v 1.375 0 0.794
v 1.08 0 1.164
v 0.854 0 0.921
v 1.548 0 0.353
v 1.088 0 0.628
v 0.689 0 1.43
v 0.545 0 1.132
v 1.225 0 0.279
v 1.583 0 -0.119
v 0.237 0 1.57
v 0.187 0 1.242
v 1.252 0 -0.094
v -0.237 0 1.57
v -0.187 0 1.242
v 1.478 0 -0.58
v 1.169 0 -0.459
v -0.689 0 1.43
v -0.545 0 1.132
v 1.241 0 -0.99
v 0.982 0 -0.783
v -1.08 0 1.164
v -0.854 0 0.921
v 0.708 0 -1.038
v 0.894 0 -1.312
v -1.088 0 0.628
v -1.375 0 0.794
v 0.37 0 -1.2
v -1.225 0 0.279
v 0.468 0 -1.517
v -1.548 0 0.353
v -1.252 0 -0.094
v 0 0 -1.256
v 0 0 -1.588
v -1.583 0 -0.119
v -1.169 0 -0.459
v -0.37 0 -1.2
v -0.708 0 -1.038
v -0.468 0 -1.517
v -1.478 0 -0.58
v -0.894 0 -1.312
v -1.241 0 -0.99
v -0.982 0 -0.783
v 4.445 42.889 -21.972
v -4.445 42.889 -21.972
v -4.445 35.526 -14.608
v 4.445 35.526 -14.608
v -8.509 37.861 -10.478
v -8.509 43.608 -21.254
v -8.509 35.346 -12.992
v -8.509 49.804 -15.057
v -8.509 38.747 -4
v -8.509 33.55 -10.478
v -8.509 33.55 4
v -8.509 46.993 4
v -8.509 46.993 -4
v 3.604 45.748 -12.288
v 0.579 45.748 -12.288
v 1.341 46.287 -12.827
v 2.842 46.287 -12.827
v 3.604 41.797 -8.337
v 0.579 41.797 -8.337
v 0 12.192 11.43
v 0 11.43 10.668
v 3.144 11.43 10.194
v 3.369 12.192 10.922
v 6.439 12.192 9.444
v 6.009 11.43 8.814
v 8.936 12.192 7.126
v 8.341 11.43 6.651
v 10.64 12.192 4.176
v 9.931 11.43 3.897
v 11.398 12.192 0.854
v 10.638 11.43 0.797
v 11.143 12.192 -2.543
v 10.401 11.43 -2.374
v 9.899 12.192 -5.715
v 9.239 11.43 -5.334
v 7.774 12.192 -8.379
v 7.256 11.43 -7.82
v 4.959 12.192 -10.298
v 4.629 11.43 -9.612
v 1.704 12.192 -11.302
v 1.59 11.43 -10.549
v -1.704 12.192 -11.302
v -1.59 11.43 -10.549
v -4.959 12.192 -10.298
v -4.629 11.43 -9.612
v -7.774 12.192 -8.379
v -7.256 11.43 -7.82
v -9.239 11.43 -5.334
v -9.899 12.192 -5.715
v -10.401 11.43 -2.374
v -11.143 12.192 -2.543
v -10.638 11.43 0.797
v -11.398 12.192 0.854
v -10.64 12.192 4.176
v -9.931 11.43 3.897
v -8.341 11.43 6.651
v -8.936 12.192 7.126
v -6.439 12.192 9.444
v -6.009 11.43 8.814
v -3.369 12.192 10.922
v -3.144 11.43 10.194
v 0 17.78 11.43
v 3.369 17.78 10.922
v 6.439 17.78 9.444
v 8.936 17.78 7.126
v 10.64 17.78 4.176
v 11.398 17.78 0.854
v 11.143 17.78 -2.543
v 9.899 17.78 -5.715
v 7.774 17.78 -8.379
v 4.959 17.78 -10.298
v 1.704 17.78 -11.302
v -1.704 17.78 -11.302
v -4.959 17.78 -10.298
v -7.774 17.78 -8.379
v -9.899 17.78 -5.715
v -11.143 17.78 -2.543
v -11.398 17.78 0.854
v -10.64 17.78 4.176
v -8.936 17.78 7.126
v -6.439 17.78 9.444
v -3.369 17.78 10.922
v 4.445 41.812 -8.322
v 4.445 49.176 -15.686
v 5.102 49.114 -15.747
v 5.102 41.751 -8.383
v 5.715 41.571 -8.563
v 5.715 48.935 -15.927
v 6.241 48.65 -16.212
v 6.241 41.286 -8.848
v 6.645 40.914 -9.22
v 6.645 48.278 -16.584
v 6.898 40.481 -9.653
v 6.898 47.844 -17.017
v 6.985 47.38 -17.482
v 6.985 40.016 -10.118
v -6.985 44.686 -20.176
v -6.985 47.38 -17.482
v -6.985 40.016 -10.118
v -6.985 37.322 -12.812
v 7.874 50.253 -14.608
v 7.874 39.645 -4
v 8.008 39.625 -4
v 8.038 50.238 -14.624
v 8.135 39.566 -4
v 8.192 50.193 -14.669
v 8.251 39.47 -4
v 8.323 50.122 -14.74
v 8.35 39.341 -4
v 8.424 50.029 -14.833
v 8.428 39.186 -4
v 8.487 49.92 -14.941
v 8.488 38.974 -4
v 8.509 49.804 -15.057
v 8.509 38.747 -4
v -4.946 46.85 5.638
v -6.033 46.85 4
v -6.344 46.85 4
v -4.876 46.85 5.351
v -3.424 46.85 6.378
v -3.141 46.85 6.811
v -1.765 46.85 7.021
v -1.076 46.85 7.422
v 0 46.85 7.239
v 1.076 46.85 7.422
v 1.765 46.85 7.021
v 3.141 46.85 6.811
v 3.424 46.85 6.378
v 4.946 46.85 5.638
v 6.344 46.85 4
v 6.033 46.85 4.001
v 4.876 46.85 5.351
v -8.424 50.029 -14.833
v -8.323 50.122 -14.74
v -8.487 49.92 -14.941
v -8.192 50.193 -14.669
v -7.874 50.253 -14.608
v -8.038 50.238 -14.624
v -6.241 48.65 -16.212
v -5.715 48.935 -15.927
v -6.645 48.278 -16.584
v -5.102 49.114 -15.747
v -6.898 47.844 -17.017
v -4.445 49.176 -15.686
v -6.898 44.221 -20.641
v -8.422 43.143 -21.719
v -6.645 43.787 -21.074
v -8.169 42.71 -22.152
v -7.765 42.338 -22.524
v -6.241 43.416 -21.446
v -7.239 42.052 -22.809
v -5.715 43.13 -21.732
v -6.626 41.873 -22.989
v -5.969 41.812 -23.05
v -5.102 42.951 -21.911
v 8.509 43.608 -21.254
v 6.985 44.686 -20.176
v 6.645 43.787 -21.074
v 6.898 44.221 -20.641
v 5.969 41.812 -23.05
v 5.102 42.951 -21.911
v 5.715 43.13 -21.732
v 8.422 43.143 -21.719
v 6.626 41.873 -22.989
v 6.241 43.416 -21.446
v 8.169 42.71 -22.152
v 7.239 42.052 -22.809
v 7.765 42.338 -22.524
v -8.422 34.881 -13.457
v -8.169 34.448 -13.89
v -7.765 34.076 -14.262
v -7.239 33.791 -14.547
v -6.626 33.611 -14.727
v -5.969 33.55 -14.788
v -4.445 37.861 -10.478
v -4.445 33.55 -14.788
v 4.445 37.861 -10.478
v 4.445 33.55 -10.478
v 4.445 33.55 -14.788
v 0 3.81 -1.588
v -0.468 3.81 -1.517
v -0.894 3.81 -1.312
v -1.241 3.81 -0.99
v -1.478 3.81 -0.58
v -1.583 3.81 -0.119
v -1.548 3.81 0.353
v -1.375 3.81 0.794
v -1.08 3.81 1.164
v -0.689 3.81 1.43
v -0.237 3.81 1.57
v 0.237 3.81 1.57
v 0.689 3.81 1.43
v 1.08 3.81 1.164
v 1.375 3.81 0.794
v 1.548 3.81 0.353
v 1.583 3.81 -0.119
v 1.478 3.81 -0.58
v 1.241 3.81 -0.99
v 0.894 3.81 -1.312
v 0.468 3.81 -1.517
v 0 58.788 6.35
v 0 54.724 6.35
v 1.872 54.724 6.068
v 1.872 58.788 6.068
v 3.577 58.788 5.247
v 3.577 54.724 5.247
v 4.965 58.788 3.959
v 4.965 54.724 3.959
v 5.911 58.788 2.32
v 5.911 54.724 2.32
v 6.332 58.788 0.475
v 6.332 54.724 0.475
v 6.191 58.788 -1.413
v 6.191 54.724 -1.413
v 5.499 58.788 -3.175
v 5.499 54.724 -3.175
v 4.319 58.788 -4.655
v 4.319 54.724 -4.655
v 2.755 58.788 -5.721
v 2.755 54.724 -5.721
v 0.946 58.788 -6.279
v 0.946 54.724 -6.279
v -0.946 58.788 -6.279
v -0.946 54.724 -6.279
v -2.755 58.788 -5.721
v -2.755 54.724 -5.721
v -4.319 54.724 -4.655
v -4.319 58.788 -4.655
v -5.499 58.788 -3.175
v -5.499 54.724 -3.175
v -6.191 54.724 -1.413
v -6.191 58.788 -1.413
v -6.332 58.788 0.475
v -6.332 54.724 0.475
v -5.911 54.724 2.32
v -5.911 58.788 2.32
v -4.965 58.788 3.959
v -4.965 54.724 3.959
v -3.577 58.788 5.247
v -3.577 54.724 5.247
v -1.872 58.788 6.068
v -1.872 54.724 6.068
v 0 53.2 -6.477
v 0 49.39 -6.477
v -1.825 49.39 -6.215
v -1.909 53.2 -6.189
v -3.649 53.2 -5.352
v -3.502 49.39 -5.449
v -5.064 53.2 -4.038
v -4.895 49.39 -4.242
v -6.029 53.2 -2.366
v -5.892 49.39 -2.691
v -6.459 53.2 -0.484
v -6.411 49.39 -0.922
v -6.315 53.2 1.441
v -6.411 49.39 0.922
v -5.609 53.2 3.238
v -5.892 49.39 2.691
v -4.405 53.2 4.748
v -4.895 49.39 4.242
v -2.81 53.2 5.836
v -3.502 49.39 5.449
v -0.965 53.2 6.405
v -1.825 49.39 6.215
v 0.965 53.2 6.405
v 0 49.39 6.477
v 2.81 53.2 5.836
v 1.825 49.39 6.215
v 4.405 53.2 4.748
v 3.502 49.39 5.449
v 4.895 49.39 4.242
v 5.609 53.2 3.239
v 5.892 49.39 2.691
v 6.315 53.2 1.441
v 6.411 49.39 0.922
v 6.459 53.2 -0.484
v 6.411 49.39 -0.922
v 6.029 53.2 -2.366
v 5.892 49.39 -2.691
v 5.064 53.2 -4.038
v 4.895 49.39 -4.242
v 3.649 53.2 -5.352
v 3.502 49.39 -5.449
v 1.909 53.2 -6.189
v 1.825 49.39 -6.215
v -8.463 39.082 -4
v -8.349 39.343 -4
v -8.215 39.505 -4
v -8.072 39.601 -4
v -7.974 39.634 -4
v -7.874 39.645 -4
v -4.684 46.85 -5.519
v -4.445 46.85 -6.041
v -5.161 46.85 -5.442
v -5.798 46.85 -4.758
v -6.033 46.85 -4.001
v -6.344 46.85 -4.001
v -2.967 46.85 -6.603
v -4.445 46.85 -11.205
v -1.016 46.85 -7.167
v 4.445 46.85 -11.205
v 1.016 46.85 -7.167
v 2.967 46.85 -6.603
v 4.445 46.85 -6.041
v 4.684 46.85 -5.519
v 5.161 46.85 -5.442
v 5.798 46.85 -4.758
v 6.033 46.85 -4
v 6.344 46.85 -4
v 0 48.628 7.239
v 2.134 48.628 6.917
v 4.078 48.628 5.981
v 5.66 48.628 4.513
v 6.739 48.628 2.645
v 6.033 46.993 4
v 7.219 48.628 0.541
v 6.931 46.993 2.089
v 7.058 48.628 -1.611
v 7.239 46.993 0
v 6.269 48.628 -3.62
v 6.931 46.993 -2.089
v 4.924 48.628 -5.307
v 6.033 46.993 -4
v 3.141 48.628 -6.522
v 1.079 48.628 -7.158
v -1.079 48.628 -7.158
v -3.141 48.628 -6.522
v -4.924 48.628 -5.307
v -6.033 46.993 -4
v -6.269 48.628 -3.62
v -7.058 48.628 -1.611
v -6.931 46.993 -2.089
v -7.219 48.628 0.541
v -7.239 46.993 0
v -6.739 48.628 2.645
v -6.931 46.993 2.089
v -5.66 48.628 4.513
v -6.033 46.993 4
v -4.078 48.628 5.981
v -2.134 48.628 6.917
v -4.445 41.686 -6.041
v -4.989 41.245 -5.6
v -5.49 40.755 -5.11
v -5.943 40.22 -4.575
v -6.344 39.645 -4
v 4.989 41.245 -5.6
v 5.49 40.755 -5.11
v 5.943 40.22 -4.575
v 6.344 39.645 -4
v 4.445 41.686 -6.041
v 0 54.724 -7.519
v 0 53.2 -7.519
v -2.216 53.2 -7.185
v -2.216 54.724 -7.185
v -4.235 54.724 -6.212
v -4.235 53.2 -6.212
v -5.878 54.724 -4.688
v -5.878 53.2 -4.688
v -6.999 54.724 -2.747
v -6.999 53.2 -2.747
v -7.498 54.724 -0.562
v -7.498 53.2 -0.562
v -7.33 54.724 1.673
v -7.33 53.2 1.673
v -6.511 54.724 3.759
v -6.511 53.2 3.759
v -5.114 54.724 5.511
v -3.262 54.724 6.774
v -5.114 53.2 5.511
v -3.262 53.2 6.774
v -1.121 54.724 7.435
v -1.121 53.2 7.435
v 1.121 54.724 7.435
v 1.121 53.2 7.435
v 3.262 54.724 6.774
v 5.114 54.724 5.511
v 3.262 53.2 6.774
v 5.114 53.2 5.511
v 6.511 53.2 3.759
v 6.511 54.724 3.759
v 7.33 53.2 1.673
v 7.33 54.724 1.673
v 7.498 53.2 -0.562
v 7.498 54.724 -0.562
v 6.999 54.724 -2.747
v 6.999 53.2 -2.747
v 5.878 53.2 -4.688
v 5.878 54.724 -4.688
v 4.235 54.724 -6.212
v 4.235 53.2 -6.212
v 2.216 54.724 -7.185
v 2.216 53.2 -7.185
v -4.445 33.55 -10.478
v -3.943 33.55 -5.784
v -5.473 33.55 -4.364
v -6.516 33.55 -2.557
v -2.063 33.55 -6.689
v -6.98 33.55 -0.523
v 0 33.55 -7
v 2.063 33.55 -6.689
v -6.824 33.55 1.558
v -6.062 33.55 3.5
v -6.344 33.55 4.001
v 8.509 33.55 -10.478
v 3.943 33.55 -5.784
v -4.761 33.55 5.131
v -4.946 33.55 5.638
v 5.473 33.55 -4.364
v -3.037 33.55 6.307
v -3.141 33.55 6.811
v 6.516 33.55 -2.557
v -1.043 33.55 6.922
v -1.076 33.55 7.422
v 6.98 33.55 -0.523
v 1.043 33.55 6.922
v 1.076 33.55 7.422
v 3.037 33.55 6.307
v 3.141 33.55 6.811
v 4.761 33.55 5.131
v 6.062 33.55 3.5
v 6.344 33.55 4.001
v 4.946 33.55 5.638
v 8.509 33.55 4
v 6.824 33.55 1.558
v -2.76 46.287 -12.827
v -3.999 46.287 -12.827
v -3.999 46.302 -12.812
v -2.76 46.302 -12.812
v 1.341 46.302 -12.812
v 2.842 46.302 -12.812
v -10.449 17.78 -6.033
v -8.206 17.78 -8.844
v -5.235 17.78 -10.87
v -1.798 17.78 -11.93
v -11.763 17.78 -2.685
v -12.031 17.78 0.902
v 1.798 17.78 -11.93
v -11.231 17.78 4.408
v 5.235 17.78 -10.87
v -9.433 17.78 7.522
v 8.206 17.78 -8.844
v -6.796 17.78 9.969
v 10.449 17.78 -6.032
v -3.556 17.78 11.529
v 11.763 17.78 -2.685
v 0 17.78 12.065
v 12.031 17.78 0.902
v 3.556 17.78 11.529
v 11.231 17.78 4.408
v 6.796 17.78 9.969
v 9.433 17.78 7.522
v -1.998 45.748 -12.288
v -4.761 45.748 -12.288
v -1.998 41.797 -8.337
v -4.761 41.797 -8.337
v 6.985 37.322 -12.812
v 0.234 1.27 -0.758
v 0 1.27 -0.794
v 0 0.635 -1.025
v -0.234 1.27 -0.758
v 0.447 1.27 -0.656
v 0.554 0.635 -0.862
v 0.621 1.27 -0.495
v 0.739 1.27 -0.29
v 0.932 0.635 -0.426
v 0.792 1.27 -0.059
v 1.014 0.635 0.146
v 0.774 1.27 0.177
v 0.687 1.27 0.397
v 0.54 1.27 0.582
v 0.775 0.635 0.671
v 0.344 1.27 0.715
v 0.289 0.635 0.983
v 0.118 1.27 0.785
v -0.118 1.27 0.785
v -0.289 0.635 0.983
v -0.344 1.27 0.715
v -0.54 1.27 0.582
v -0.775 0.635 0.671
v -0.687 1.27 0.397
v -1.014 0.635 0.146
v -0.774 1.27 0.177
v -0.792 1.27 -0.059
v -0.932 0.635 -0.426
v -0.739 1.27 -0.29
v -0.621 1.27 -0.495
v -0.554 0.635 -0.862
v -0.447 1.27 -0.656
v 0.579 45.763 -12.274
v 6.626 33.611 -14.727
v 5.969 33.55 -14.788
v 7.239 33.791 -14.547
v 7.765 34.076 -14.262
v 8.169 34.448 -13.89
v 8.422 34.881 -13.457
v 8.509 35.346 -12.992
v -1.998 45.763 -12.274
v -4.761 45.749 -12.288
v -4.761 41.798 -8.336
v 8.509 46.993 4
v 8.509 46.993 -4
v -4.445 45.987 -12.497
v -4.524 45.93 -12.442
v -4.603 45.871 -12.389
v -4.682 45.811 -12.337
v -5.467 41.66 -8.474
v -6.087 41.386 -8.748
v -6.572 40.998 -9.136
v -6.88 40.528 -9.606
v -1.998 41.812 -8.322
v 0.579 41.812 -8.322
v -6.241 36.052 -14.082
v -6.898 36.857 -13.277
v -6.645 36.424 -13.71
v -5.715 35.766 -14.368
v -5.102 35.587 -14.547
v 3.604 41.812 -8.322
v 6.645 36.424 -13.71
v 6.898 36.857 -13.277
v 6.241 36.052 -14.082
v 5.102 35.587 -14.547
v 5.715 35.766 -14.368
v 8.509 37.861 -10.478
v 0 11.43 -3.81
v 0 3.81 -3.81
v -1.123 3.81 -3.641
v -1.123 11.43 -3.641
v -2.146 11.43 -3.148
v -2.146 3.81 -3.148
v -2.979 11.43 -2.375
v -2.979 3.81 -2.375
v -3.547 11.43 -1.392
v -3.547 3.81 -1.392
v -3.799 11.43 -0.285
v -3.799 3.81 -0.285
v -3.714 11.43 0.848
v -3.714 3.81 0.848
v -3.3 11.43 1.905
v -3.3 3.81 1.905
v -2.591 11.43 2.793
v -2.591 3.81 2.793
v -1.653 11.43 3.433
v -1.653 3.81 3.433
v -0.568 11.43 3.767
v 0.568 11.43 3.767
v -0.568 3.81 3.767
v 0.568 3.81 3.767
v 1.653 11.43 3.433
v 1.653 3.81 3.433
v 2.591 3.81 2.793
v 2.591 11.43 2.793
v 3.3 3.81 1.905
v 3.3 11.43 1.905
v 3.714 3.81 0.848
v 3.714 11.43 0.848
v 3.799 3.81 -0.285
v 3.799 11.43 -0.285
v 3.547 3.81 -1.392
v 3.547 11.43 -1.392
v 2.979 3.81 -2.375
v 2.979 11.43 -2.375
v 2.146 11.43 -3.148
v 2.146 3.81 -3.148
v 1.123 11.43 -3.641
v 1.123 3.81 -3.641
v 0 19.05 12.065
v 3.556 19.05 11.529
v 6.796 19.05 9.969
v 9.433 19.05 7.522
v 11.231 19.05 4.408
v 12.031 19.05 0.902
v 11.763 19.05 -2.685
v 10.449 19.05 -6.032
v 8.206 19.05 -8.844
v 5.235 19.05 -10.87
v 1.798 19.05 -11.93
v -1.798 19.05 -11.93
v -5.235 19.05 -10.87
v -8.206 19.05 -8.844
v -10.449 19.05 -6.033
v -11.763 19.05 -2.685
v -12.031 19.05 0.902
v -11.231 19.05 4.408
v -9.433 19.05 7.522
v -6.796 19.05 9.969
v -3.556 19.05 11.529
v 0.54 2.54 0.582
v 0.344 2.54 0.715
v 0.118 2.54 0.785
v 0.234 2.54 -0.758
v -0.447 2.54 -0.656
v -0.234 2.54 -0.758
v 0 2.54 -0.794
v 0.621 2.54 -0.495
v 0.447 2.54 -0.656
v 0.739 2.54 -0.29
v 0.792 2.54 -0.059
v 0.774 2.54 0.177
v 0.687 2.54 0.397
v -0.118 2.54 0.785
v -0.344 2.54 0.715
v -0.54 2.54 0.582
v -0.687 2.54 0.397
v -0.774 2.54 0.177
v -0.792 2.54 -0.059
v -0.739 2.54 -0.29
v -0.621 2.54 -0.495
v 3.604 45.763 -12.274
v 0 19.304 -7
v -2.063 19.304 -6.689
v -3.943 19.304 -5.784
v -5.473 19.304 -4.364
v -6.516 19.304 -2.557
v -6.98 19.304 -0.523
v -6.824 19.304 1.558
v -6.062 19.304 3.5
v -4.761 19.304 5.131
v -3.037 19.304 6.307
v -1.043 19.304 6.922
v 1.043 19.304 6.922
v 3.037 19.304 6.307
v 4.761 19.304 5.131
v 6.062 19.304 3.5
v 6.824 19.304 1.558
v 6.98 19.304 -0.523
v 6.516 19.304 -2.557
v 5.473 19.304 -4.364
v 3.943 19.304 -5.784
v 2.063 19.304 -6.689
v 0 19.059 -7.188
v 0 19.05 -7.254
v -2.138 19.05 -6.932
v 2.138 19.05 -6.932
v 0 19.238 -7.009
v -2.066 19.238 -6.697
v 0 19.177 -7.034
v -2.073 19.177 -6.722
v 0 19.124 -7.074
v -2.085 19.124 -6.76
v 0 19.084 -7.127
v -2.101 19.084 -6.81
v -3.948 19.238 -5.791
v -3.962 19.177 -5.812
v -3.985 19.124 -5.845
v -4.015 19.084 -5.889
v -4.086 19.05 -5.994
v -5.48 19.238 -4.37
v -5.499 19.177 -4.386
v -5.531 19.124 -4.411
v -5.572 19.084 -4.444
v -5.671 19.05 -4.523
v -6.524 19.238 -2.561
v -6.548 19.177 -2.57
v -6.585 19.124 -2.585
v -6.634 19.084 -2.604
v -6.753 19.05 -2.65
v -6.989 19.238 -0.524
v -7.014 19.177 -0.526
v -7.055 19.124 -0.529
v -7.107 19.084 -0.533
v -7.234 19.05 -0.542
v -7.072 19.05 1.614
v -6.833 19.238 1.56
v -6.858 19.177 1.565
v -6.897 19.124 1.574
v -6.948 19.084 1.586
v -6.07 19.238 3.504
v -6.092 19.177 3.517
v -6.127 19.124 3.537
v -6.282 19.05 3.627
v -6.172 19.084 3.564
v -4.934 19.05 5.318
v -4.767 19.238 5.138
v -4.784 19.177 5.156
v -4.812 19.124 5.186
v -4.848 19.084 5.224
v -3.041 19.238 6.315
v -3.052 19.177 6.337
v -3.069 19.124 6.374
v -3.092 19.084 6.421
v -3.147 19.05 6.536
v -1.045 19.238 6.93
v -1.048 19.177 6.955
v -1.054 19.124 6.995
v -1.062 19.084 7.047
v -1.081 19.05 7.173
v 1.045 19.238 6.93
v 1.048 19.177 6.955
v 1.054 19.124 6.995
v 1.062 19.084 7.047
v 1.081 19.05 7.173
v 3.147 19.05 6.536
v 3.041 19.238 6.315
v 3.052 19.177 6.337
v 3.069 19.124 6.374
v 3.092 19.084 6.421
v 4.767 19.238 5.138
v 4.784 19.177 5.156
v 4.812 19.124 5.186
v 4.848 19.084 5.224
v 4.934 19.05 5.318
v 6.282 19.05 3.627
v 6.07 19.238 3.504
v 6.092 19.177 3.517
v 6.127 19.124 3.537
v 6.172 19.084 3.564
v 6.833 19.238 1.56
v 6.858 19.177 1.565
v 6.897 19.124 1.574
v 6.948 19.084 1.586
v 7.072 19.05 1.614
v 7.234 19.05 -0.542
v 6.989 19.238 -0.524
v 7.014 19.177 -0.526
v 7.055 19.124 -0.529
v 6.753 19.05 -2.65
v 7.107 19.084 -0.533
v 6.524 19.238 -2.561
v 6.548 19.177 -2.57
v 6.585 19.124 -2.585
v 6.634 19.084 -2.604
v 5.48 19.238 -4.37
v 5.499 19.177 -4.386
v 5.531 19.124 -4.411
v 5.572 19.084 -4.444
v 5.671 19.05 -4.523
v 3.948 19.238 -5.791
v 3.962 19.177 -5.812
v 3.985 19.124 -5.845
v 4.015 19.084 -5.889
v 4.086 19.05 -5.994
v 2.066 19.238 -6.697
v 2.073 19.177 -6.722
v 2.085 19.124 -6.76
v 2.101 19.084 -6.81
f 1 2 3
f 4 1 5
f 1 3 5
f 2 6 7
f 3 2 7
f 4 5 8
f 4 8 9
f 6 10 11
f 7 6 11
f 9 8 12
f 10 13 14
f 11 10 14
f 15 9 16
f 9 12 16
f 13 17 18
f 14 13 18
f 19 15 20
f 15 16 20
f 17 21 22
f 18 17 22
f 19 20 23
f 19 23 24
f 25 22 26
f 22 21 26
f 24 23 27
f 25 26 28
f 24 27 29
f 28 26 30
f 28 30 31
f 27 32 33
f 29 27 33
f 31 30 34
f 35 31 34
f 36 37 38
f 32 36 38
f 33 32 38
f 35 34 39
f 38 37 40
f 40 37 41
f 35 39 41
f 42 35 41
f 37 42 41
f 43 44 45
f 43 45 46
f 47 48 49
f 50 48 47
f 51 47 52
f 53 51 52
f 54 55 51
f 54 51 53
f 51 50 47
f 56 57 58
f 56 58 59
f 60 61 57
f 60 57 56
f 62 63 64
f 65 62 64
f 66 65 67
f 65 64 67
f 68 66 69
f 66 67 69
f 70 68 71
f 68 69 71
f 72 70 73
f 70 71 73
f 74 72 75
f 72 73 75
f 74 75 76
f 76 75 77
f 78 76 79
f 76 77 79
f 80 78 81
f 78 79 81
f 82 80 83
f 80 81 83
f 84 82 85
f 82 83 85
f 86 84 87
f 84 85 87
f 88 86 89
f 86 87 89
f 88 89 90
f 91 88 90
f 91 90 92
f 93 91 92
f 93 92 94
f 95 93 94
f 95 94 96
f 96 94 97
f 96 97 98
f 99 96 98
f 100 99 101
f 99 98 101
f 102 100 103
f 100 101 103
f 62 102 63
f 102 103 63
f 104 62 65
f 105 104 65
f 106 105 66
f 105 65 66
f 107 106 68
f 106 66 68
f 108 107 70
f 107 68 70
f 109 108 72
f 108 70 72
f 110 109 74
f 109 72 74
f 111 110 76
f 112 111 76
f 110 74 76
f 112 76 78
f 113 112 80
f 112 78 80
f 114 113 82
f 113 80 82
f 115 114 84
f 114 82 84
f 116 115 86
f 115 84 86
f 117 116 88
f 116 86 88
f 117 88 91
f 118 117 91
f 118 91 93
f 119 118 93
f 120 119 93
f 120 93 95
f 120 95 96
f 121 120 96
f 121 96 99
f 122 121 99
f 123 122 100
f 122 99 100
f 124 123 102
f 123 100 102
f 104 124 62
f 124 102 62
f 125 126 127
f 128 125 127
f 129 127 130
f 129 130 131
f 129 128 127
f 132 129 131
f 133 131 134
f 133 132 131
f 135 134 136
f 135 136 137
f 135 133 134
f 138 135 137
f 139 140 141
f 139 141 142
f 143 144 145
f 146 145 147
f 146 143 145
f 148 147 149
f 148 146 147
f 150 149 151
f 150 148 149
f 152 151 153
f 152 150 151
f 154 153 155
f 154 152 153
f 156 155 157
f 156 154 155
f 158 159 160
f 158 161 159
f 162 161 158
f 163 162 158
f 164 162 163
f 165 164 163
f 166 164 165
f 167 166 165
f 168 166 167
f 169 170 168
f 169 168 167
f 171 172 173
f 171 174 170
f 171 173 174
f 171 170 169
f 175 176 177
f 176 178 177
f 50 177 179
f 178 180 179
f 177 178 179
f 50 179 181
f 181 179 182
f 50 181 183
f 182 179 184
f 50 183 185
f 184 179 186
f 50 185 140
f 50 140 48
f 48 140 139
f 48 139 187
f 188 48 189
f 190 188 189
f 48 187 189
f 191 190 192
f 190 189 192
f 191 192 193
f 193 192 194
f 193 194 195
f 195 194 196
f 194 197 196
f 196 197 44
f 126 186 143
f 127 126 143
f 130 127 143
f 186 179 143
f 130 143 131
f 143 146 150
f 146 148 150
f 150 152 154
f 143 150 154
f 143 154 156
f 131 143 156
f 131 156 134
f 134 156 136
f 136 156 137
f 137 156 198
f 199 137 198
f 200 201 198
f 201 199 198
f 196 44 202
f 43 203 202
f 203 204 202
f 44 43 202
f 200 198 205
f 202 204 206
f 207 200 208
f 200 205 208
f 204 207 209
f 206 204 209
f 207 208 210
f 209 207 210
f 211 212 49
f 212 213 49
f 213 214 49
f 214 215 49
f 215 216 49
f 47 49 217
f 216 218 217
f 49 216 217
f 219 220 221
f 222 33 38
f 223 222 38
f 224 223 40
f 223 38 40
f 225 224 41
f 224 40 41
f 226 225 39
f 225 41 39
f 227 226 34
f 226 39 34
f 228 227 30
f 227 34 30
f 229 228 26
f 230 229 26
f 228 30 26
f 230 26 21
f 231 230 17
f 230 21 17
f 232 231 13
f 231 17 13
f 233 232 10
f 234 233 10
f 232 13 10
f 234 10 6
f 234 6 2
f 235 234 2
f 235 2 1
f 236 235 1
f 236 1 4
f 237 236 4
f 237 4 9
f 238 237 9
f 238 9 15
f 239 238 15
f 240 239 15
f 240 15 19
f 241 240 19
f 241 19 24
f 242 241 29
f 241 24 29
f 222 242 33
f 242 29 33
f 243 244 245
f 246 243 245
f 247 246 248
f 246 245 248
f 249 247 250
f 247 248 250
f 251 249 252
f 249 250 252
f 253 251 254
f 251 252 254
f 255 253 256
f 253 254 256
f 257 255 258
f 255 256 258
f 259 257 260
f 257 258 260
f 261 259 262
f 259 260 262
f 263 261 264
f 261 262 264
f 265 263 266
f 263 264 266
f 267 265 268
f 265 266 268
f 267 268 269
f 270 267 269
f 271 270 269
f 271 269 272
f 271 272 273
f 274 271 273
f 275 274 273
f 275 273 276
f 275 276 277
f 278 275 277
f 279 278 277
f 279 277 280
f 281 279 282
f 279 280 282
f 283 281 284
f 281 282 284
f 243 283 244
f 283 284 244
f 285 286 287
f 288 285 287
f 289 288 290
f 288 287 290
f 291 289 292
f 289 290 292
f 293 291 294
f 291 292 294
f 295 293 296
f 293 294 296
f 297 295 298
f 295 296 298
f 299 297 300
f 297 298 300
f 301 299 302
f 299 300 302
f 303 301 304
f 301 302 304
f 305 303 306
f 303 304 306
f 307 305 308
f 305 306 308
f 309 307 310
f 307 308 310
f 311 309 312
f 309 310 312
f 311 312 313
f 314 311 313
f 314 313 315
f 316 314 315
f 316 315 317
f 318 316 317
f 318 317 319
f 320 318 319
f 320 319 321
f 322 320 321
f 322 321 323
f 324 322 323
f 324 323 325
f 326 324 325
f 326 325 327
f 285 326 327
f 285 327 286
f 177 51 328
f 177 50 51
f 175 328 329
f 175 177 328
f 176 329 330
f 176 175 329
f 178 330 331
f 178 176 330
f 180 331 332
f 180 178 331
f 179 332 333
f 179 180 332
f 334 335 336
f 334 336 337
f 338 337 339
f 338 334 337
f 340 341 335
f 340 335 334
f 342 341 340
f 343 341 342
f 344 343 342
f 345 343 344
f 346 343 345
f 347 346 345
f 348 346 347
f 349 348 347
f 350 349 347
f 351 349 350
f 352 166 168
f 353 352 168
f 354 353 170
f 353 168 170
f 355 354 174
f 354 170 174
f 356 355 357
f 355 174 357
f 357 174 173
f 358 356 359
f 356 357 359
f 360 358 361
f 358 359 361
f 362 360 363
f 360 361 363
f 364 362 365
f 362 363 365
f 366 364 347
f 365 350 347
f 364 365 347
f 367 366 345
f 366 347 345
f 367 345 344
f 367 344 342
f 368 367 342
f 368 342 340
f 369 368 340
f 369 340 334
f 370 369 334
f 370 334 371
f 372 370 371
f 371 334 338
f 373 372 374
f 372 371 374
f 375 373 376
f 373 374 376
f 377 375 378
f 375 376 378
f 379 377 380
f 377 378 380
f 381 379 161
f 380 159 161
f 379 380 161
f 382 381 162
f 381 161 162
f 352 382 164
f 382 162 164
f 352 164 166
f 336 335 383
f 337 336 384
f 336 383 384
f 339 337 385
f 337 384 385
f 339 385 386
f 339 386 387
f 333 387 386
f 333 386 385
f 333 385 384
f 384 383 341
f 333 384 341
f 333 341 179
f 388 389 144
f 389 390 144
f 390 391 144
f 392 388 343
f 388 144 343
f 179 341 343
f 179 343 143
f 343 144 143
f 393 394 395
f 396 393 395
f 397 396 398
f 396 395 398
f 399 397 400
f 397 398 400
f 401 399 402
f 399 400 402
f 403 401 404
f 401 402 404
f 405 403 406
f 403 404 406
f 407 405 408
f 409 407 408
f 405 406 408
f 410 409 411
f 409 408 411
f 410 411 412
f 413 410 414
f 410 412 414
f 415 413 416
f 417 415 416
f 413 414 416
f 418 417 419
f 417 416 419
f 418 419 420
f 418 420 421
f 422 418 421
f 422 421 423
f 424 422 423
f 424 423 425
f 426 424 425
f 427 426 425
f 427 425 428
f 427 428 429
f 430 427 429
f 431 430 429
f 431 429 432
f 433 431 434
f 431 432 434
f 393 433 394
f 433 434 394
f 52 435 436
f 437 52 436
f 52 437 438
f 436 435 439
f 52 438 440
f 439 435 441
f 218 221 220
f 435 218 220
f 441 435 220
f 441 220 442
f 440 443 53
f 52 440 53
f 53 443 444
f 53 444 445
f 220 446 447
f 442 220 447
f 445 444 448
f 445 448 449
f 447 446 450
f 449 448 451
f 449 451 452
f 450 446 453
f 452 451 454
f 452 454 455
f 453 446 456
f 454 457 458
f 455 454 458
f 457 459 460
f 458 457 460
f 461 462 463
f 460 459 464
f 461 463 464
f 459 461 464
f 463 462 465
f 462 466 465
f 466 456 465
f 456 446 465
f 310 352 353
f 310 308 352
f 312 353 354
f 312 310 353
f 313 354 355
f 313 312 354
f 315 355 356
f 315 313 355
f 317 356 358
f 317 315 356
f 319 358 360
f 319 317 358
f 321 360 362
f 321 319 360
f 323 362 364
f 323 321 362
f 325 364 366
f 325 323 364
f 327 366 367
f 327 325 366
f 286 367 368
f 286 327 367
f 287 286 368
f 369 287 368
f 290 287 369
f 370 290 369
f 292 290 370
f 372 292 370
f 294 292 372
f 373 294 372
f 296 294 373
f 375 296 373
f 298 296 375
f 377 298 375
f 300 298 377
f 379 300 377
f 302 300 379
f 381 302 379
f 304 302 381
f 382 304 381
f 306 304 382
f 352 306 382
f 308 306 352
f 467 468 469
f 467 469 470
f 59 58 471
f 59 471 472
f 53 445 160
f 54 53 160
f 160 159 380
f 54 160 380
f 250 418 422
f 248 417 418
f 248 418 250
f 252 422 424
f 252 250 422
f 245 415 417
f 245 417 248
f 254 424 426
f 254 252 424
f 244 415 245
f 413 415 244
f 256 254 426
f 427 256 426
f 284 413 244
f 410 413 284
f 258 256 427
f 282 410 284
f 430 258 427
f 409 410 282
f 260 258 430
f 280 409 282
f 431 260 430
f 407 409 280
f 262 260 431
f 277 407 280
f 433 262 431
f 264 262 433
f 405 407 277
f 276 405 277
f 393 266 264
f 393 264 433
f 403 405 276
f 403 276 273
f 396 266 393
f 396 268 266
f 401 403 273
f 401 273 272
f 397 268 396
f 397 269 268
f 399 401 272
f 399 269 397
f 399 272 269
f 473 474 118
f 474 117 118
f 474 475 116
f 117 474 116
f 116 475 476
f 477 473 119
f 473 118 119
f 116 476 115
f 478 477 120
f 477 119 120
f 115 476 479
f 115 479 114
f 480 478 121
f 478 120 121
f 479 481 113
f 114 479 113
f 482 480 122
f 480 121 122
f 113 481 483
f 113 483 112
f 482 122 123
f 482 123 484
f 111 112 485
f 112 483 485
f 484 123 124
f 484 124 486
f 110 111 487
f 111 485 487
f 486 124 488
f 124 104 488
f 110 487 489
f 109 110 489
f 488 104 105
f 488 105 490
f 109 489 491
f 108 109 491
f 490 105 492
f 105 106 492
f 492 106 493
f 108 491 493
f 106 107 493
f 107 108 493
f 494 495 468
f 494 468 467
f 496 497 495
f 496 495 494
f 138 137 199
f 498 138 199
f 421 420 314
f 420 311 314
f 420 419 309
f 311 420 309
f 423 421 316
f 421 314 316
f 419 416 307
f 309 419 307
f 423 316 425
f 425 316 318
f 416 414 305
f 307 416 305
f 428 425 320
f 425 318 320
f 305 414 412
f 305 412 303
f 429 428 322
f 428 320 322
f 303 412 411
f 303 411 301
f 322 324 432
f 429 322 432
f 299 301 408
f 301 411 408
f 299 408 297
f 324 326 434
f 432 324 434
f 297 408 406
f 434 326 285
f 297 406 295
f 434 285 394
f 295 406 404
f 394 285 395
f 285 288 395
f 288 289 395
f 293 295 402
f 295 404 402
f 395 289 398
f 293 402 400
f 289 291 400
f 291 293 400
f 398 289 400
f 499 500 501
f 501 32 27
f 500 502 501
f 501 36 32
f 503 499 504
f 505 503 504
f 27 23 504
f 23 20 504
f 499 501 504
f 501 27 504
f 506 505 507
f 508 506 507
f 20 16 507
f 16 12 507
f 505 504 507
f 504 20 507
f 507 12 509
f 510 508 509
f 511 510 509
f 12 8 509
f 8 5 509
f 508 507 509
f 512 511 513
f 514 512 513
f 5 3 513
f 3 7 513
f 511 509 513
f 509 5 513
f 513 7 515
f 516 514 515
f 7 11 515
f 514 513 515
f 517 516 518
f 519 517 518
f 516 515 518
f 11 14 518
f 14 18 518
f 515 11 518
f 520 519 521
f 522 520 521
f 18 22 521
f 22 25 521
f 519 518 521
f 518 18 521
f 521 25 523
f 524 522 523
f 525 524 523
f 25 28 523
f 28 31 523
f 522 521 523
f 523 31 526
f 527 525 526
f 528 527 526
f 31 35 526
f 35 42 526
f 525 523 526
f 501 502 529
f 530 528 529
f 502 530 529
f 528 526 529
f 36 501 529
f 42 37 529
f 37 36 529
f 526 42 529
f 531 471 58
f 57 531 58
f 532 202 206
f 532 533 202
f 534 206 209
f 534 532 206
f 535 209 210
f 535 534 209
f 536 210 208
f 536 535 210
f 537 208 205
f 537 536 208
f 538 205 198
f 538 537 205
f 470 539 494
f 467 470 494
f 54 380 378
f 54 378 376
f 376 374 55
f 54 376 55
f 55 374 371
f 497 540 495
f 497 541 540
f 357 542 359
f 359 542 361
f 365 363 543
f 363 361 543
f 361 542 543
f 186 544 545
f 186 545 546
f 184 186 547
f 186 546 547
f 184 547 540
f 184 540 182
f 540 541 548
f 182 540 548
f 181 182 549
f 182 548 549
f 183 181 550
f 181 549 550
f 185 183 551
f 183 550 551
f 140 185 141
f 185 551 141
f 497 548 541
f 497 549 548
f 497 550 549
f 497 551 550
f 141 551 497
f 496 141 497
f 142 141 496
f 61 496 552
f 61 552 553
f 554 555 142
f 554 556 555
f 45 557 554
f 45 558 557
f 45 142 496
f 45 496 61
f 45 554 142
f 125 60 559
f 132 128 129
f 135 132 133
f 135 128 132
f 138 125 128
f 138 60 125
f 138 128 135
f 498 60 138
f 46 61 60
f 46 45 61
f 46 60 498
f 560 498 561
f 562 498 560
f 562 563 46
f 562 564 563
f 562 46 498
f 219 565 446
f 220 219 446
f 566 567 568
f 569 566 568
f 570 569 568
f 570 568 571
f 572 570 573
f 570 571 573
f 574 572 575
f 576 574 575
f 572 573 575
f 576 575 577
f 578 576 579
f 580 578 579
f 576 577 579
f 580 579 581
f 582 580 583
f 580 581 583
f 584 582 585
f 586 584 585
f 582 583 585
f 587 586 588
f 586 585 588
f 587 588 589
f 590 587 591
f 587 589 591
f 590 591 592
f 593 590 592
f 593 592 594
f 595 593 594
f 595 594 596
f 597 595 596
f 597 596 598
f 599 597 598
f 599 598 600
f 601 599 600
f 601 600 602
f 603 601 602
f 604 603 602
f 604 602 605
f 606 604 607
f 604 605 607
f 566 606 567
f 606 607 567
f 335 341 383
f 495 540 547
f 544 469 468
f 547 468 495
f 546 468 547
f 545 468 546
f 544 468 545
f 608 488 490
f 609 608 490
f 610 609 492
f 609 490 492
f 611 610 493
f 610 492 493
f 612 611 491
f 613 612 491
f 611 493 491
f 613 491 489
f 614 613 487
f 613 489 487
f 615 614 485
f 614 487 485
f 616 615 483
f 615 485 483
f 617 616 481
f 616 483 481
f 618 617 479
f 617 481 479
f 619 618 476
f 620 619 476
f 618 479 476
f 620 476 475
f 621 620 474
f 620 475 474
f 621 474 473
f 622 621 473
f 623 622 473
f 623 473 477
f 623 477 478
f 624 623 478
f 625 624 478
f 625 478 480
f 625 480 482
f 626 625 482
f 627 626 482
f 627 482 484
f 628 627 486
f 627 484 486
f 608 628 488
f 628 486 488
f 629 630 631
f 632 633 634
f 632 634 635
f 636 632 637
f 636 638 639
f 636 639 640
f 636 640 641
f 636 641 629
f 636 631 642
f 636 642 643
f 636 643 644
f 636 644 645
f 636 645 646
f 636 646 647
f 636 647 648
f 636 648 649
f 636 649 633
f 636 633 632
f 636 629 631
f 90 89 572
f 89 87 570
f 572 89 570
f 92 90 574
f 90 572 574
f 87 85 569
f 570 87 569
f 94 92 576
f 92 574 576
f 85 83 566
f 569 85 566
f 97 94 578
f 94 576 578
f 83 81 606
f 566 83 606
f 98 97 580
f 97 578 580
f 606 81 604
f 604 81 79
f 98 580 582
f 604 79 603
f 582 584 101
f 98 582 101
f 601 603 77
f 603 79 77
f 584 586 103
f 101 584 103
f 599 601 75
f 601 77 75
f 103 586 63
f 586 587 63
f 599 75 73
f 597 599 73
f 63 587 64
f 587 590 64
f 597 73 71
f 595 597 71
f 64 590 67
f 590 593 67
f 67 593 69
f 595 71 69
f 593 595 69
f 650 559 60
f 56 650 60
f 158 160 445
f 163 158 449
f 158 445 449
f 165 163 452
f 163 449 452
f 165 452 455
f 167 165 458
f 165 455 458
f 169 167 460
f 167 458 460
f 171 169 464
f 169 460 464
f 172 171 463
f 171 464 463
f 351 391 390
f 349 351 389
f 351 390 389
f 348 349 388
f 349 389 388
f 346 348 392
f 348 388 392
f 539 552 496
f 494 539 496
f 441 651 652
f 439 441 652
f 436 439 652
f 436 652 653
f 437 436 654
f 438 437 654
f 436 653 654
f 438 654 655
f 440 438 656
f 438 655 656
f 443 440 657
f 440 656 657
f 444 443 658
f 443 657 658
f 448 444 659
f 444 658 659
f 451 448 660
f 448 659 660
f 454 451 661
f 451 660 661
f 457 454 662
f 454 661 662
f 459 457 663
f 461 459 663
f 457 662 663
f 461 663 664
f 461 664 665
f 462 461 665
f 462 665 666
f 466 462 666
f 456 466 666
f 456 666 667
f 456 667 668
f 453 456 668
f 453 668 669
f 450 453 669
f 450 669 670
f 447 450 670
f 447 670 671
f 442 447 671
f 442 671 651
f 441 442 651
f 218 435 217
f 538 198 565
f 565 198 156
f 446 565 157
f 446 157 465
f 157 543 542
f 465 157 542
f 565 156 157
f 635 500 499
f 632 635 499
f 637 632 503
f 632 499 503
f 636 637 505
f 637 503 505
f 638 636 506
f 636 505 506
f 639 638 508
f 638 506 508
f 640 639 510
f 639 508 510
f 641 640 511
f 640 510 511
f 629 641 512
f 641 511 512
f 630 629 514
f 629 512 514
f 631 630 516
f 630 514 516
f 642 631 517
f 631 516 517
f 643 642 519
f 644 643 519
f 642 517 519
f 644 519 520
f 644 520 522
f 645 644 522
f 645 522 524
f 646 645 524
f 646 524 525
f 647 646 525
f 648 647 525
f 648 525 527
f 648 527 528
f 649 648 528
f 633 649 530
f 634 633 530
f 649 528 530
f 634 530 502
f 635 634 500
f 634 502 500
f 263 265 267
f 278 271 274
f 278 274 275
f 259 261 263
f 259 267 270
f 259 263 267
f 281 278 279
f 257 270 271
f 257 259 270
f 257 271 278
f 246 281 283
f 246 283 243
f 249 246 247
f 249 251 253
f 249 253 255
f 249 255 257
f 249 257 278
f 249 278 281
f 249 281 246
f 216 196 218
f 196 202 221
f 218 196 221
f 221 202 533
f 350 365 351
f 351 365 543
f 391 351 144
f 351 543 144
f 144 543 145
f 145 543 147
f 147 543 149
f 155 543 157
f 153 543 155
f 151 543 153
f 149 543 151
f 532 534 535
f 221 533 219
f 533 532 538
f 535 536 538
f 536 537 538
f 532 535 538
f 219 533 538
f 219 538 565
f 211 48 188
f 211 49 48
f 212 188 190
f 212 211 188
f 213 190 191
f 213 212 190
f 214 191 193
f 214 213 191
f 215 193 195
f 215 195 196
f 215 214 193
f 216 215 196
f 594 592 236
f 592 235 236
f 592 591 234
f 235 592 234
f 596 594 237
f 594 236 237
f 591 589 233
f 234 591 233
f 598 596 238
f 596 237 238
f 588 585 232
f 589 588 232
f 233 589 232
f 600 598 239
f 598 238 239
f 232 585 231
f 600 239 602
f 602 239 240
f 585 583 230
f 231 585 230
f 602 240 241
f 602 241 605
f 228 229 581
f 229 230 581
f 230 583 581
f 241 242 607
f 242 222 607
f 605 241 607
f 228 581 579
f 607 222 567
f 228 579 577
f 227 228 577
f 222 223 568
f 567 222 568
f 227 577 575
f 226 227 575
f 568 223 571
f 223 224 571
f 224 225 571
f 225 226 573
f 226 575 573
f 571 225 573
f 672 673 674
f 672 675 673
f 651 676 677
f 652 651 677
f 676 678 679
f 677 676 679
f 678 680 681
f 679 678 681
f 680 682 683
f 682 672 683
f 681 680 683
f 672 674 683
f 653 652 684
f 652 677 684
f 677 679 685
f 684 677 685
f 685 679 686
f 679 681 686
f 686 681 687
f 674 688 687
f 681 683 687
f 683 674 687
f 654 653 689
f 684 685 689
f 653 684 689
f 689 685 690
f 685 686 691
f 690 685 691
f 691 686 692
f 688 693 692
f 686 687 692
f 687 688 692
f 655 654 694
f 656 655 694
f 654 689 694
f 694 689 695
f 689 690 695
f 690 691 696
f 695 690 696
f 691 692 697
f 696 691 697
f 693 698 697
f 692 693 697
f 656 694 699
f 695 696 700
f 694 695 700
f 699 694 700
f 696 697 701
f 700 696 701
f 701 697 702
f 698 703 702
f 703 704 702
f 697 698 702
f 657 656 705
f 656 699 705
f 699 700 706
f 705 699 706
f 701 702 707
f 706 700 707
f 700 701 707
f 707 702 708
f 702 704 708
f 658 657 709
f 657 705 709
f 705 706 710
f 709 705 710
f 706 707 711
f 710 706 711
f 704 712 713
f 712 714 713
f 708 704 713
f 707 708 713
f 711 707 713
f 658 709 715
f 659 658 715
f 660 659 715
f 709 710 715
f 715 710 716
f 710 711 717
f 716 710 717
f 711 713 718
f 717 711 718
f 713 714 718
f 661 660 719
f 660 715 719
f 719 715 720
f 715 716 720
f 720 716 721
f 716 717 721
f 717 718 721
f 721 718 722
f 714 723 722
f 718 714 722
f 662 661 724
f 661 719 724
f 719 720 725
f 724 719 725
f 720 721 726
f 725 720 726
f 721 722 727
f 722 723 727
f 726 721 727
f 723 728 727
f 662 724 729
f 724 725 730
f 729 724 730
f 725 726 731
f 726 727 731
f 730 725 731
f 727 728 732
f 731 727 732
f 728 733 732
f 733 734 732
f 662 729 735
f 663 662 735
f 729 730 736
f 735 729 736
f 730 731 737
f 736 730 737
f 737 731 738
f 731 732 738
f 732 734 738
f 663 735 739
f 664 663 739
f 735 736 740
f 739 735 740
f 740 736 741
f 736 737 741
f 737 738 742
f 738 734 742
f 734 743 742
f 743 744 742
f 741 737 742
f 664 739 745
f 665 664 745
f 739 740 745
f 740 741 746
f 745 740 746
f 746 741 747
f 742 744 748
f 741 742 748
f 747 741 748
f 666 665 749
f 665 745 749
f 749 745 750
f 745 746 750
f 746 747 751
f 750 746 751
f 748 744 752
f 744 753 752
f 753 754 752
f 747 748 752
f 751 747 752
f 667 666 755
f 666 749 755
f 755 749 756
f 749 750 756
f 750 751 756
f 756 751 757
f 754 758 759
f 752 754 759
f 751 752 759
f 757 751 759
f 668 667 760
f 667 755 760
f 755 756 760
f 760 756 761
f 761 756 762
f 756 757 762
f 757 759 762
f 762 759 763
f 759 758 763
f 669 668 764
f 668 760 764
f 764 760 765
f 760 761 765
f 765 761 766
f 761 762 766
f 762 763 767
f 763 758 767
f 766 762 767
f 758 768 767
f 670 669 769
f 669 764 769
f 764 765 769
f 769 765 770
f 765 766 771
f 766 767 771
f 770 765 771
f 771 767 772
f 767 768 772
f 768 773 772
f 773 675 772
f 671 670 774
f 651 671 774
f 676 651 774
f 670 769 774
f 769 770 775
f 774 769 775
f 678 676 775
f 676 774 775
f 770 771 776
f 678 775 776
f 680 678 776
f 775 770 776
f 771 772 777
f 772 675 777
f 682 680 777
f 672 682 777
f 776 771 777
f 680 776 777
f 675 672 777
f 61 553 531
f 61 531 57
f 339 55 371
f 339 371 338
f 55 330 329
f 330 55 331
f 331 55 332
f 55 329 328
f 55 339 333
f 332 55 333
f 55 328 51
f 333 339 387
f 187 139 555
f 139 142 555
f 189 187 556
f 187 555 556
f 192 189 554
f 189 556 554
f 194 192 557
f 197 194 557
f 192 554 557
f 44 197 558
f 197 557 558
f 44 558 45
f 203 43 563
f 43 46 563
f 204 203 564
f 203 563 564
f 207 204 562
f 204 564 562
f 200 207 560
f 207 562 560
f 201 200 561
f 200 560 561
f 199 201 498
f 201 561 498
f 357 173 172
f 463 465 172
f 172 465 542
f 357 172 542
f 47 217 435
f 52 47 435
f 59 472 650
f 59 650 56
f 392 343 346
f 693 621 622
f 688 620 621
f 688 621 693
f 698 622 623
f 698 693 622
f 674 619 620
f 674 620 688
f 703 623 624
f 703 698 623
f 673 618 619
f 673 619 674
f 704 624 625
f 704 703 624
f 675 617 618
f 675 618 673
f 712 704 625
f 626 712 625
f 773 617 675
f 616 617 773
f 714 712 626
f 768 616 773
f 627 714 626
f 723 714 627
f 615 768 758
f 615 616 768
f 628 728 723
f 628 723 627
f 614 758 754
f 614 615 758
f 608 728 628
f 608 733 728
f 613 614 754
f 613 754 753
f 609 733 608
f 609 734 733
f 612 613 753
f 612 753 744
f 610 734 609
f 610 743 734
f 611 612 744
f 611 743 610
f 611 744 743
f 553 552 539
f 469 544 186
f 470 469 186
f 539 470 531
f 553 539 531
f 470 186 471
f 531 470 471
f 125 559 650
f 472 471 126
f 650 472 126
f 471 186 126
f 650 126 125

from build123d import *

# Parameters (mm, degrees)
SKETCH1_R          = 1.5875
EXTRUDE1_DEPTH     = 3.81
SKETCH2_R          = 3.81
EXTRUDE2_DEPTH     = 7.62
SKETCH3_R          = 11.43
EXTRUDE3_DEPTH     = 6.35
SKETCH4_R          = 12.065
EXTRUDE4_DEPTH     = 1.27
SKETCH5_R          = 7
EXTRUDE5_DEPTH     = 14.5
SKETCH6_R          = 7.5
EXTRUDE6_DEPTH     = 13.3
SKETCH7_R          = 7.239
EXTRUDE7_DEPTH     = 2.54
CHAMFER6_SIZE      = 0.762
SKETCH8_R          = 6.477
EXTRUDE8_DEPTH     = 3.81
SKETCH9_R          = 0.79375
CUT_EXTRUDE1_DEPTH = 2.54
CHAMFER1_SIZE      = 1.27
CHAMFER1_SIZE2     = 0.462242198
SKETCH10_R         = 7.518539915
EXTRUDE9_DEPTH     = 1.524
SKETCH11_R         = 6.35
EXTRUDE10_DEPTH    = 4.064
FILLET1_R          = 0.254
CHAMFER7_SIZE      = 0.762
EXTRUDE11_DEPTH    = 8.509
SKETCH13_W         = 13.97
SKETCH13_H         = 8.89
CUT_EXTRUDE2_DEPTH = 10.414
SKETCH14_W         = 2.763435098
SKETCH14_H         = 1.082967808
SKETCH14_W_2       = 3.024841121
EXTRUDE12_DEPTH    = 6.35
CHAMFER8_SIZE      = 0.762
FILLET2_R          = 2.54
FILLET3_R          = 0.635
EXTRUDE13_DEPTH    = 4.445


with BuildPart() as part:
    # Sketch1 → Extrude1 (new body)
    with BuildSketch(Plane(origin=(0, 0, 0), x_dir=(1, 0, 0), z_dir=(0, 1, 0))):
        with Locations(Location((0, 0, 0), (0, 0, 90))):
            Circle(SKETCH1_R)
    extrude(amount=EXTRUDE1_DEPTH)

    # Sketch2 → Extrude2 (add)
    with BuildSketch(Plane(origin=(0, 3.81, 0), x_dir=(1, 0, 0), z_dir=(0, 1, 0))):
        with Locations(Location((0, 0, 0), (0, 0, 90))):
            Circle(SKETCH2_R)
    extrude(amount=EXTRUDE2_DEPTH)

    # Sketch3 → Extrude3 (add)
    with BuildSketch(Plane(origin=(0, 11.43, 0), x_dir=(1, 0, 0), z_dir=(0, 1, 0))):
        with Locations(Location((0, 0, 0), (0, 0, 270))):
            Circle(SKETCH3_R)
    extrude(amount=EXTRUDE3_DEPTH)

    # Sketch4 → Extrude4 (add)
    with BuildSketch(Plane(origin=(0, 17.78, 0), x_dir=(1, 0, 0), z_dir=(0, 1, 0))):
        with Locations(Location((0, 0, 0), (0, 0, 270))):
            Circle(SKETCH4_R)
    extrude(amount=EXTRUDE4_DEPTH)

    # Sketch5 → Extrude5 (add)
    with BuildSketch(Plane(origin=(0, 19.05, 0), x_dir=(1, 0, 0), z_dir=(0, 1, 0))):
        with Locations(Location((0, 0, 0), (0, 0, 90))):
            Circle(SKETCH5_R)
    extrude(amount=EXTRUDE5_DEPTH)

    # Sketch6 → Extrude6 (add)
    with BuildSketch(Plane(origin=(0, 33.55, 0), x_dir=(1, 0, 0), z_dir=(0, 1, 0))):
        with Locations(Location((0, 0, 0), (0, 0, 270))):
            Circle(SKETCH6_R)
    extrude(amount=EXTRUDE6_DEPTH)

    # Sketch7 → Extrude7 (add)
    with BuildSketch(Plane(origin=(0, 46.85, 0), x_dir=(1, 0, 0), z_dir=(0, 1, 0))):
        with Locations(Location((0, 0, 0), (0, 0, 270))):
            Circle(SKETCH7_R)
    extrude(amount=EXTRUDE7_DEPTH)

    # Chamfer6
    chamfer6_edges = [part.edges().sort_by_distance(p)[0] for p in [
        (0, 49.39, -7.239),
    ]]
    chamfer(chamfer6_edges, length=CHAMFER6_SIZE)

    # Sketch8 → Extrude8 (add)
    with BuildSketch(Plane(origin=(0, 49.39, 0), x_dir=(1, 0, 0), z_dir=(0, 1, 0))):
        with Locations(Location((0, 0, 0), (0, 0, 90))):
            Circle(SKETCH8_R)
    extrude(amount=EXTRUDE8_DEPTH)

    # Sketch9 → Cut-Extrude1 (cut)
    with BuildSketch(Plane.XZ):
        with Locations(Location((0, 0, 0), (0, 0, 270))):
            Circle(SKETCH9_R)
    extrude(amount=-CUT_EXTRUDE1_DEPTH, mode=Mode.SUBTRACT)

    # Chamfer1
    chamfer1_edges = [part.edges().sort_by_distance(p)[0] for p in [
        (0, 0, 0.79375),
    ]]
    chamfer1_side = [part.faces().sort_by_distance(p)[0] for p in [
        (0, 1.27, 0.79375),
    ]]
    chamfer(chamfer1_edges, length=CHAMFER1_SIZE, length2=CHAMFER1_SIZE2, reference=chamfer1_side[0])

    # Sketch10 → Extrude9 (add)
    with BuildSketch(Plane(origin=(0, 53.2, 0), x_dir=(1, 0, 0), z_dir=(0, 1, 0))):
        with Locations(Location((0, 0, 0), (0, 0, 90))):
            Circle(SKETCH10_R)
    extrude(amount=EXTRUDE9_DEPTH)

    # Sketch11 → Extrude10 (add)
    with BuildSketch(Plane(origin=(0, 54.724, 0), x_dir=(1, 0, 0), z_dir=(0, 1, 0))):
        with Locations(Location((0, 0, 0), (0, 0, 270))):
            Circle(SKETCH11_R)
    extrude(amount=EXTRUDE10_DEPTH)

    # Fillet1
    fillet1_edges = [part.edges().sort_by_distance(p)[0] for p in [
        (0, 19.05, 7),
    ]]
    fillet(fillet1_edges, radius=FILLET1_R)

    # Chamfer7
    chamfer7_edges = [part.edges().sort_by_distance(p)[0] for p in [
        (0, 11.43, -11.43),
    ]]
    chamfer(chamfer7_edges, length=CHAMFER7_SIZE)

    # Sketch12 → Extrude11 (add, symmetric)
    with BuildSketch(Plane(origin=(0, 0, 0), x_dir=(0, 0, -1), z_dir=(1, 0, 0))):
        Polygon((-4.0005, 33.55), (-4.0005, 46.993498834), (4.0005, 46.993498834), (4.0005, 39.645358569), (14.608417816, 50.253276385), (23.049858569, 41.811835631), (14.788022938, 33.55), (10.4775, 37.860522938), (10.4775, 33.55), align=None)
    extrude(amount=EXTRUDE11_DEPTH, both=True)

    # Sketch13 → Cut-Extrude2 (cut)
    with BuildSketch(Plane(origin=(0, 32.4308471, -32.4308471), x_dir=(1, 0, 0), z_dir=(0, 0.7071067811865482, -0.7071067811865468))):
        with Locations((0, -19.235721209)):
            Rectangle(SKETCH13_W, SKETCH13_H)
    extrude(amount=-CUT_EXTRUDE2_DEPTH, mode=Mode.SUBTRACT)

    # Sketch14 → Extrude12 (add)
    with BuildSketch(Plane(origin=(0, 25.067037081, -25.067037081), x_dir=(1, 0, 0), z_dir=(0, 0.7071067811865475, -0.7071067811865477))):
        with Locations((-3.379408051, -24.201118939)):
            Rectangle(SKETCH14_W, SKETCH14_H)
        with Locations((2.091446569, -24.201118939)):
            Rectangle(SKETCH14_W_2, SKETCH14_H)
    extrude(amount=EXTRUDE12_DEPTH)

    # Chamfer8
    chamfer8_edges = [part.edges().sort_by_distance(p)[0] for p in [
        (-1.997690502, 46.294508604, -12.81982168),
        (-4.7611256, 46.294508604, -12.81982168),
        (3.60386713, 46.294508604, -12.81982168),
        (0.579026009, 46.294508604, -12.81982168),
    ]]
    chamfer(chamfer8_edges, length=CHAMFER8_SIZE)

    # Fillet2
    fillet2_edges = [part.edges().sort_by_distance(p)[0] for p in [
        (-8.509, 37.680917816, -18.918940754),
        (8.509, 37.680917816, -18.918940754),
        (6.985, 39.207561356, -18.290322825),
        (-6.985, 39.207561356, -18.290322825),
        (-6.985, 45.493740641, -12.004143541),
        (6.985, 45.493740641, -12.004143541),
    ]]
    fillet(fillet2_edges, radius=FILLET2_R)

    # Fillet3
    fillet3_edges = [part.edges().sort_by_distance(p)[0] for p in [
        (-8.509, 44.949317477, -9.304458908),
        (8.509, 44.949317477, -9.304458908),
    ]]
    fillet(fillet3_edges, radius=FILLET3_R)

    # Sketch15 → Extrude13 (add, symmetric)
    with BuildSketch(Plane(origin=(0, 0, 0), x_dir=(0, 0, -1), z_dir=(1, 0, 0))):
        Polygon((5.360156527, 46.85), (12.103167043, 46.85), (5.360156527, 41.005015096), align=None)
        Polygon((10.4775, 33.55), (14.788022938, 33.55), (10.4775, 37.860522938), align=None)
    extrude(amount=EXTRUDE13_DEPTH, both=True)


solid = part.part
